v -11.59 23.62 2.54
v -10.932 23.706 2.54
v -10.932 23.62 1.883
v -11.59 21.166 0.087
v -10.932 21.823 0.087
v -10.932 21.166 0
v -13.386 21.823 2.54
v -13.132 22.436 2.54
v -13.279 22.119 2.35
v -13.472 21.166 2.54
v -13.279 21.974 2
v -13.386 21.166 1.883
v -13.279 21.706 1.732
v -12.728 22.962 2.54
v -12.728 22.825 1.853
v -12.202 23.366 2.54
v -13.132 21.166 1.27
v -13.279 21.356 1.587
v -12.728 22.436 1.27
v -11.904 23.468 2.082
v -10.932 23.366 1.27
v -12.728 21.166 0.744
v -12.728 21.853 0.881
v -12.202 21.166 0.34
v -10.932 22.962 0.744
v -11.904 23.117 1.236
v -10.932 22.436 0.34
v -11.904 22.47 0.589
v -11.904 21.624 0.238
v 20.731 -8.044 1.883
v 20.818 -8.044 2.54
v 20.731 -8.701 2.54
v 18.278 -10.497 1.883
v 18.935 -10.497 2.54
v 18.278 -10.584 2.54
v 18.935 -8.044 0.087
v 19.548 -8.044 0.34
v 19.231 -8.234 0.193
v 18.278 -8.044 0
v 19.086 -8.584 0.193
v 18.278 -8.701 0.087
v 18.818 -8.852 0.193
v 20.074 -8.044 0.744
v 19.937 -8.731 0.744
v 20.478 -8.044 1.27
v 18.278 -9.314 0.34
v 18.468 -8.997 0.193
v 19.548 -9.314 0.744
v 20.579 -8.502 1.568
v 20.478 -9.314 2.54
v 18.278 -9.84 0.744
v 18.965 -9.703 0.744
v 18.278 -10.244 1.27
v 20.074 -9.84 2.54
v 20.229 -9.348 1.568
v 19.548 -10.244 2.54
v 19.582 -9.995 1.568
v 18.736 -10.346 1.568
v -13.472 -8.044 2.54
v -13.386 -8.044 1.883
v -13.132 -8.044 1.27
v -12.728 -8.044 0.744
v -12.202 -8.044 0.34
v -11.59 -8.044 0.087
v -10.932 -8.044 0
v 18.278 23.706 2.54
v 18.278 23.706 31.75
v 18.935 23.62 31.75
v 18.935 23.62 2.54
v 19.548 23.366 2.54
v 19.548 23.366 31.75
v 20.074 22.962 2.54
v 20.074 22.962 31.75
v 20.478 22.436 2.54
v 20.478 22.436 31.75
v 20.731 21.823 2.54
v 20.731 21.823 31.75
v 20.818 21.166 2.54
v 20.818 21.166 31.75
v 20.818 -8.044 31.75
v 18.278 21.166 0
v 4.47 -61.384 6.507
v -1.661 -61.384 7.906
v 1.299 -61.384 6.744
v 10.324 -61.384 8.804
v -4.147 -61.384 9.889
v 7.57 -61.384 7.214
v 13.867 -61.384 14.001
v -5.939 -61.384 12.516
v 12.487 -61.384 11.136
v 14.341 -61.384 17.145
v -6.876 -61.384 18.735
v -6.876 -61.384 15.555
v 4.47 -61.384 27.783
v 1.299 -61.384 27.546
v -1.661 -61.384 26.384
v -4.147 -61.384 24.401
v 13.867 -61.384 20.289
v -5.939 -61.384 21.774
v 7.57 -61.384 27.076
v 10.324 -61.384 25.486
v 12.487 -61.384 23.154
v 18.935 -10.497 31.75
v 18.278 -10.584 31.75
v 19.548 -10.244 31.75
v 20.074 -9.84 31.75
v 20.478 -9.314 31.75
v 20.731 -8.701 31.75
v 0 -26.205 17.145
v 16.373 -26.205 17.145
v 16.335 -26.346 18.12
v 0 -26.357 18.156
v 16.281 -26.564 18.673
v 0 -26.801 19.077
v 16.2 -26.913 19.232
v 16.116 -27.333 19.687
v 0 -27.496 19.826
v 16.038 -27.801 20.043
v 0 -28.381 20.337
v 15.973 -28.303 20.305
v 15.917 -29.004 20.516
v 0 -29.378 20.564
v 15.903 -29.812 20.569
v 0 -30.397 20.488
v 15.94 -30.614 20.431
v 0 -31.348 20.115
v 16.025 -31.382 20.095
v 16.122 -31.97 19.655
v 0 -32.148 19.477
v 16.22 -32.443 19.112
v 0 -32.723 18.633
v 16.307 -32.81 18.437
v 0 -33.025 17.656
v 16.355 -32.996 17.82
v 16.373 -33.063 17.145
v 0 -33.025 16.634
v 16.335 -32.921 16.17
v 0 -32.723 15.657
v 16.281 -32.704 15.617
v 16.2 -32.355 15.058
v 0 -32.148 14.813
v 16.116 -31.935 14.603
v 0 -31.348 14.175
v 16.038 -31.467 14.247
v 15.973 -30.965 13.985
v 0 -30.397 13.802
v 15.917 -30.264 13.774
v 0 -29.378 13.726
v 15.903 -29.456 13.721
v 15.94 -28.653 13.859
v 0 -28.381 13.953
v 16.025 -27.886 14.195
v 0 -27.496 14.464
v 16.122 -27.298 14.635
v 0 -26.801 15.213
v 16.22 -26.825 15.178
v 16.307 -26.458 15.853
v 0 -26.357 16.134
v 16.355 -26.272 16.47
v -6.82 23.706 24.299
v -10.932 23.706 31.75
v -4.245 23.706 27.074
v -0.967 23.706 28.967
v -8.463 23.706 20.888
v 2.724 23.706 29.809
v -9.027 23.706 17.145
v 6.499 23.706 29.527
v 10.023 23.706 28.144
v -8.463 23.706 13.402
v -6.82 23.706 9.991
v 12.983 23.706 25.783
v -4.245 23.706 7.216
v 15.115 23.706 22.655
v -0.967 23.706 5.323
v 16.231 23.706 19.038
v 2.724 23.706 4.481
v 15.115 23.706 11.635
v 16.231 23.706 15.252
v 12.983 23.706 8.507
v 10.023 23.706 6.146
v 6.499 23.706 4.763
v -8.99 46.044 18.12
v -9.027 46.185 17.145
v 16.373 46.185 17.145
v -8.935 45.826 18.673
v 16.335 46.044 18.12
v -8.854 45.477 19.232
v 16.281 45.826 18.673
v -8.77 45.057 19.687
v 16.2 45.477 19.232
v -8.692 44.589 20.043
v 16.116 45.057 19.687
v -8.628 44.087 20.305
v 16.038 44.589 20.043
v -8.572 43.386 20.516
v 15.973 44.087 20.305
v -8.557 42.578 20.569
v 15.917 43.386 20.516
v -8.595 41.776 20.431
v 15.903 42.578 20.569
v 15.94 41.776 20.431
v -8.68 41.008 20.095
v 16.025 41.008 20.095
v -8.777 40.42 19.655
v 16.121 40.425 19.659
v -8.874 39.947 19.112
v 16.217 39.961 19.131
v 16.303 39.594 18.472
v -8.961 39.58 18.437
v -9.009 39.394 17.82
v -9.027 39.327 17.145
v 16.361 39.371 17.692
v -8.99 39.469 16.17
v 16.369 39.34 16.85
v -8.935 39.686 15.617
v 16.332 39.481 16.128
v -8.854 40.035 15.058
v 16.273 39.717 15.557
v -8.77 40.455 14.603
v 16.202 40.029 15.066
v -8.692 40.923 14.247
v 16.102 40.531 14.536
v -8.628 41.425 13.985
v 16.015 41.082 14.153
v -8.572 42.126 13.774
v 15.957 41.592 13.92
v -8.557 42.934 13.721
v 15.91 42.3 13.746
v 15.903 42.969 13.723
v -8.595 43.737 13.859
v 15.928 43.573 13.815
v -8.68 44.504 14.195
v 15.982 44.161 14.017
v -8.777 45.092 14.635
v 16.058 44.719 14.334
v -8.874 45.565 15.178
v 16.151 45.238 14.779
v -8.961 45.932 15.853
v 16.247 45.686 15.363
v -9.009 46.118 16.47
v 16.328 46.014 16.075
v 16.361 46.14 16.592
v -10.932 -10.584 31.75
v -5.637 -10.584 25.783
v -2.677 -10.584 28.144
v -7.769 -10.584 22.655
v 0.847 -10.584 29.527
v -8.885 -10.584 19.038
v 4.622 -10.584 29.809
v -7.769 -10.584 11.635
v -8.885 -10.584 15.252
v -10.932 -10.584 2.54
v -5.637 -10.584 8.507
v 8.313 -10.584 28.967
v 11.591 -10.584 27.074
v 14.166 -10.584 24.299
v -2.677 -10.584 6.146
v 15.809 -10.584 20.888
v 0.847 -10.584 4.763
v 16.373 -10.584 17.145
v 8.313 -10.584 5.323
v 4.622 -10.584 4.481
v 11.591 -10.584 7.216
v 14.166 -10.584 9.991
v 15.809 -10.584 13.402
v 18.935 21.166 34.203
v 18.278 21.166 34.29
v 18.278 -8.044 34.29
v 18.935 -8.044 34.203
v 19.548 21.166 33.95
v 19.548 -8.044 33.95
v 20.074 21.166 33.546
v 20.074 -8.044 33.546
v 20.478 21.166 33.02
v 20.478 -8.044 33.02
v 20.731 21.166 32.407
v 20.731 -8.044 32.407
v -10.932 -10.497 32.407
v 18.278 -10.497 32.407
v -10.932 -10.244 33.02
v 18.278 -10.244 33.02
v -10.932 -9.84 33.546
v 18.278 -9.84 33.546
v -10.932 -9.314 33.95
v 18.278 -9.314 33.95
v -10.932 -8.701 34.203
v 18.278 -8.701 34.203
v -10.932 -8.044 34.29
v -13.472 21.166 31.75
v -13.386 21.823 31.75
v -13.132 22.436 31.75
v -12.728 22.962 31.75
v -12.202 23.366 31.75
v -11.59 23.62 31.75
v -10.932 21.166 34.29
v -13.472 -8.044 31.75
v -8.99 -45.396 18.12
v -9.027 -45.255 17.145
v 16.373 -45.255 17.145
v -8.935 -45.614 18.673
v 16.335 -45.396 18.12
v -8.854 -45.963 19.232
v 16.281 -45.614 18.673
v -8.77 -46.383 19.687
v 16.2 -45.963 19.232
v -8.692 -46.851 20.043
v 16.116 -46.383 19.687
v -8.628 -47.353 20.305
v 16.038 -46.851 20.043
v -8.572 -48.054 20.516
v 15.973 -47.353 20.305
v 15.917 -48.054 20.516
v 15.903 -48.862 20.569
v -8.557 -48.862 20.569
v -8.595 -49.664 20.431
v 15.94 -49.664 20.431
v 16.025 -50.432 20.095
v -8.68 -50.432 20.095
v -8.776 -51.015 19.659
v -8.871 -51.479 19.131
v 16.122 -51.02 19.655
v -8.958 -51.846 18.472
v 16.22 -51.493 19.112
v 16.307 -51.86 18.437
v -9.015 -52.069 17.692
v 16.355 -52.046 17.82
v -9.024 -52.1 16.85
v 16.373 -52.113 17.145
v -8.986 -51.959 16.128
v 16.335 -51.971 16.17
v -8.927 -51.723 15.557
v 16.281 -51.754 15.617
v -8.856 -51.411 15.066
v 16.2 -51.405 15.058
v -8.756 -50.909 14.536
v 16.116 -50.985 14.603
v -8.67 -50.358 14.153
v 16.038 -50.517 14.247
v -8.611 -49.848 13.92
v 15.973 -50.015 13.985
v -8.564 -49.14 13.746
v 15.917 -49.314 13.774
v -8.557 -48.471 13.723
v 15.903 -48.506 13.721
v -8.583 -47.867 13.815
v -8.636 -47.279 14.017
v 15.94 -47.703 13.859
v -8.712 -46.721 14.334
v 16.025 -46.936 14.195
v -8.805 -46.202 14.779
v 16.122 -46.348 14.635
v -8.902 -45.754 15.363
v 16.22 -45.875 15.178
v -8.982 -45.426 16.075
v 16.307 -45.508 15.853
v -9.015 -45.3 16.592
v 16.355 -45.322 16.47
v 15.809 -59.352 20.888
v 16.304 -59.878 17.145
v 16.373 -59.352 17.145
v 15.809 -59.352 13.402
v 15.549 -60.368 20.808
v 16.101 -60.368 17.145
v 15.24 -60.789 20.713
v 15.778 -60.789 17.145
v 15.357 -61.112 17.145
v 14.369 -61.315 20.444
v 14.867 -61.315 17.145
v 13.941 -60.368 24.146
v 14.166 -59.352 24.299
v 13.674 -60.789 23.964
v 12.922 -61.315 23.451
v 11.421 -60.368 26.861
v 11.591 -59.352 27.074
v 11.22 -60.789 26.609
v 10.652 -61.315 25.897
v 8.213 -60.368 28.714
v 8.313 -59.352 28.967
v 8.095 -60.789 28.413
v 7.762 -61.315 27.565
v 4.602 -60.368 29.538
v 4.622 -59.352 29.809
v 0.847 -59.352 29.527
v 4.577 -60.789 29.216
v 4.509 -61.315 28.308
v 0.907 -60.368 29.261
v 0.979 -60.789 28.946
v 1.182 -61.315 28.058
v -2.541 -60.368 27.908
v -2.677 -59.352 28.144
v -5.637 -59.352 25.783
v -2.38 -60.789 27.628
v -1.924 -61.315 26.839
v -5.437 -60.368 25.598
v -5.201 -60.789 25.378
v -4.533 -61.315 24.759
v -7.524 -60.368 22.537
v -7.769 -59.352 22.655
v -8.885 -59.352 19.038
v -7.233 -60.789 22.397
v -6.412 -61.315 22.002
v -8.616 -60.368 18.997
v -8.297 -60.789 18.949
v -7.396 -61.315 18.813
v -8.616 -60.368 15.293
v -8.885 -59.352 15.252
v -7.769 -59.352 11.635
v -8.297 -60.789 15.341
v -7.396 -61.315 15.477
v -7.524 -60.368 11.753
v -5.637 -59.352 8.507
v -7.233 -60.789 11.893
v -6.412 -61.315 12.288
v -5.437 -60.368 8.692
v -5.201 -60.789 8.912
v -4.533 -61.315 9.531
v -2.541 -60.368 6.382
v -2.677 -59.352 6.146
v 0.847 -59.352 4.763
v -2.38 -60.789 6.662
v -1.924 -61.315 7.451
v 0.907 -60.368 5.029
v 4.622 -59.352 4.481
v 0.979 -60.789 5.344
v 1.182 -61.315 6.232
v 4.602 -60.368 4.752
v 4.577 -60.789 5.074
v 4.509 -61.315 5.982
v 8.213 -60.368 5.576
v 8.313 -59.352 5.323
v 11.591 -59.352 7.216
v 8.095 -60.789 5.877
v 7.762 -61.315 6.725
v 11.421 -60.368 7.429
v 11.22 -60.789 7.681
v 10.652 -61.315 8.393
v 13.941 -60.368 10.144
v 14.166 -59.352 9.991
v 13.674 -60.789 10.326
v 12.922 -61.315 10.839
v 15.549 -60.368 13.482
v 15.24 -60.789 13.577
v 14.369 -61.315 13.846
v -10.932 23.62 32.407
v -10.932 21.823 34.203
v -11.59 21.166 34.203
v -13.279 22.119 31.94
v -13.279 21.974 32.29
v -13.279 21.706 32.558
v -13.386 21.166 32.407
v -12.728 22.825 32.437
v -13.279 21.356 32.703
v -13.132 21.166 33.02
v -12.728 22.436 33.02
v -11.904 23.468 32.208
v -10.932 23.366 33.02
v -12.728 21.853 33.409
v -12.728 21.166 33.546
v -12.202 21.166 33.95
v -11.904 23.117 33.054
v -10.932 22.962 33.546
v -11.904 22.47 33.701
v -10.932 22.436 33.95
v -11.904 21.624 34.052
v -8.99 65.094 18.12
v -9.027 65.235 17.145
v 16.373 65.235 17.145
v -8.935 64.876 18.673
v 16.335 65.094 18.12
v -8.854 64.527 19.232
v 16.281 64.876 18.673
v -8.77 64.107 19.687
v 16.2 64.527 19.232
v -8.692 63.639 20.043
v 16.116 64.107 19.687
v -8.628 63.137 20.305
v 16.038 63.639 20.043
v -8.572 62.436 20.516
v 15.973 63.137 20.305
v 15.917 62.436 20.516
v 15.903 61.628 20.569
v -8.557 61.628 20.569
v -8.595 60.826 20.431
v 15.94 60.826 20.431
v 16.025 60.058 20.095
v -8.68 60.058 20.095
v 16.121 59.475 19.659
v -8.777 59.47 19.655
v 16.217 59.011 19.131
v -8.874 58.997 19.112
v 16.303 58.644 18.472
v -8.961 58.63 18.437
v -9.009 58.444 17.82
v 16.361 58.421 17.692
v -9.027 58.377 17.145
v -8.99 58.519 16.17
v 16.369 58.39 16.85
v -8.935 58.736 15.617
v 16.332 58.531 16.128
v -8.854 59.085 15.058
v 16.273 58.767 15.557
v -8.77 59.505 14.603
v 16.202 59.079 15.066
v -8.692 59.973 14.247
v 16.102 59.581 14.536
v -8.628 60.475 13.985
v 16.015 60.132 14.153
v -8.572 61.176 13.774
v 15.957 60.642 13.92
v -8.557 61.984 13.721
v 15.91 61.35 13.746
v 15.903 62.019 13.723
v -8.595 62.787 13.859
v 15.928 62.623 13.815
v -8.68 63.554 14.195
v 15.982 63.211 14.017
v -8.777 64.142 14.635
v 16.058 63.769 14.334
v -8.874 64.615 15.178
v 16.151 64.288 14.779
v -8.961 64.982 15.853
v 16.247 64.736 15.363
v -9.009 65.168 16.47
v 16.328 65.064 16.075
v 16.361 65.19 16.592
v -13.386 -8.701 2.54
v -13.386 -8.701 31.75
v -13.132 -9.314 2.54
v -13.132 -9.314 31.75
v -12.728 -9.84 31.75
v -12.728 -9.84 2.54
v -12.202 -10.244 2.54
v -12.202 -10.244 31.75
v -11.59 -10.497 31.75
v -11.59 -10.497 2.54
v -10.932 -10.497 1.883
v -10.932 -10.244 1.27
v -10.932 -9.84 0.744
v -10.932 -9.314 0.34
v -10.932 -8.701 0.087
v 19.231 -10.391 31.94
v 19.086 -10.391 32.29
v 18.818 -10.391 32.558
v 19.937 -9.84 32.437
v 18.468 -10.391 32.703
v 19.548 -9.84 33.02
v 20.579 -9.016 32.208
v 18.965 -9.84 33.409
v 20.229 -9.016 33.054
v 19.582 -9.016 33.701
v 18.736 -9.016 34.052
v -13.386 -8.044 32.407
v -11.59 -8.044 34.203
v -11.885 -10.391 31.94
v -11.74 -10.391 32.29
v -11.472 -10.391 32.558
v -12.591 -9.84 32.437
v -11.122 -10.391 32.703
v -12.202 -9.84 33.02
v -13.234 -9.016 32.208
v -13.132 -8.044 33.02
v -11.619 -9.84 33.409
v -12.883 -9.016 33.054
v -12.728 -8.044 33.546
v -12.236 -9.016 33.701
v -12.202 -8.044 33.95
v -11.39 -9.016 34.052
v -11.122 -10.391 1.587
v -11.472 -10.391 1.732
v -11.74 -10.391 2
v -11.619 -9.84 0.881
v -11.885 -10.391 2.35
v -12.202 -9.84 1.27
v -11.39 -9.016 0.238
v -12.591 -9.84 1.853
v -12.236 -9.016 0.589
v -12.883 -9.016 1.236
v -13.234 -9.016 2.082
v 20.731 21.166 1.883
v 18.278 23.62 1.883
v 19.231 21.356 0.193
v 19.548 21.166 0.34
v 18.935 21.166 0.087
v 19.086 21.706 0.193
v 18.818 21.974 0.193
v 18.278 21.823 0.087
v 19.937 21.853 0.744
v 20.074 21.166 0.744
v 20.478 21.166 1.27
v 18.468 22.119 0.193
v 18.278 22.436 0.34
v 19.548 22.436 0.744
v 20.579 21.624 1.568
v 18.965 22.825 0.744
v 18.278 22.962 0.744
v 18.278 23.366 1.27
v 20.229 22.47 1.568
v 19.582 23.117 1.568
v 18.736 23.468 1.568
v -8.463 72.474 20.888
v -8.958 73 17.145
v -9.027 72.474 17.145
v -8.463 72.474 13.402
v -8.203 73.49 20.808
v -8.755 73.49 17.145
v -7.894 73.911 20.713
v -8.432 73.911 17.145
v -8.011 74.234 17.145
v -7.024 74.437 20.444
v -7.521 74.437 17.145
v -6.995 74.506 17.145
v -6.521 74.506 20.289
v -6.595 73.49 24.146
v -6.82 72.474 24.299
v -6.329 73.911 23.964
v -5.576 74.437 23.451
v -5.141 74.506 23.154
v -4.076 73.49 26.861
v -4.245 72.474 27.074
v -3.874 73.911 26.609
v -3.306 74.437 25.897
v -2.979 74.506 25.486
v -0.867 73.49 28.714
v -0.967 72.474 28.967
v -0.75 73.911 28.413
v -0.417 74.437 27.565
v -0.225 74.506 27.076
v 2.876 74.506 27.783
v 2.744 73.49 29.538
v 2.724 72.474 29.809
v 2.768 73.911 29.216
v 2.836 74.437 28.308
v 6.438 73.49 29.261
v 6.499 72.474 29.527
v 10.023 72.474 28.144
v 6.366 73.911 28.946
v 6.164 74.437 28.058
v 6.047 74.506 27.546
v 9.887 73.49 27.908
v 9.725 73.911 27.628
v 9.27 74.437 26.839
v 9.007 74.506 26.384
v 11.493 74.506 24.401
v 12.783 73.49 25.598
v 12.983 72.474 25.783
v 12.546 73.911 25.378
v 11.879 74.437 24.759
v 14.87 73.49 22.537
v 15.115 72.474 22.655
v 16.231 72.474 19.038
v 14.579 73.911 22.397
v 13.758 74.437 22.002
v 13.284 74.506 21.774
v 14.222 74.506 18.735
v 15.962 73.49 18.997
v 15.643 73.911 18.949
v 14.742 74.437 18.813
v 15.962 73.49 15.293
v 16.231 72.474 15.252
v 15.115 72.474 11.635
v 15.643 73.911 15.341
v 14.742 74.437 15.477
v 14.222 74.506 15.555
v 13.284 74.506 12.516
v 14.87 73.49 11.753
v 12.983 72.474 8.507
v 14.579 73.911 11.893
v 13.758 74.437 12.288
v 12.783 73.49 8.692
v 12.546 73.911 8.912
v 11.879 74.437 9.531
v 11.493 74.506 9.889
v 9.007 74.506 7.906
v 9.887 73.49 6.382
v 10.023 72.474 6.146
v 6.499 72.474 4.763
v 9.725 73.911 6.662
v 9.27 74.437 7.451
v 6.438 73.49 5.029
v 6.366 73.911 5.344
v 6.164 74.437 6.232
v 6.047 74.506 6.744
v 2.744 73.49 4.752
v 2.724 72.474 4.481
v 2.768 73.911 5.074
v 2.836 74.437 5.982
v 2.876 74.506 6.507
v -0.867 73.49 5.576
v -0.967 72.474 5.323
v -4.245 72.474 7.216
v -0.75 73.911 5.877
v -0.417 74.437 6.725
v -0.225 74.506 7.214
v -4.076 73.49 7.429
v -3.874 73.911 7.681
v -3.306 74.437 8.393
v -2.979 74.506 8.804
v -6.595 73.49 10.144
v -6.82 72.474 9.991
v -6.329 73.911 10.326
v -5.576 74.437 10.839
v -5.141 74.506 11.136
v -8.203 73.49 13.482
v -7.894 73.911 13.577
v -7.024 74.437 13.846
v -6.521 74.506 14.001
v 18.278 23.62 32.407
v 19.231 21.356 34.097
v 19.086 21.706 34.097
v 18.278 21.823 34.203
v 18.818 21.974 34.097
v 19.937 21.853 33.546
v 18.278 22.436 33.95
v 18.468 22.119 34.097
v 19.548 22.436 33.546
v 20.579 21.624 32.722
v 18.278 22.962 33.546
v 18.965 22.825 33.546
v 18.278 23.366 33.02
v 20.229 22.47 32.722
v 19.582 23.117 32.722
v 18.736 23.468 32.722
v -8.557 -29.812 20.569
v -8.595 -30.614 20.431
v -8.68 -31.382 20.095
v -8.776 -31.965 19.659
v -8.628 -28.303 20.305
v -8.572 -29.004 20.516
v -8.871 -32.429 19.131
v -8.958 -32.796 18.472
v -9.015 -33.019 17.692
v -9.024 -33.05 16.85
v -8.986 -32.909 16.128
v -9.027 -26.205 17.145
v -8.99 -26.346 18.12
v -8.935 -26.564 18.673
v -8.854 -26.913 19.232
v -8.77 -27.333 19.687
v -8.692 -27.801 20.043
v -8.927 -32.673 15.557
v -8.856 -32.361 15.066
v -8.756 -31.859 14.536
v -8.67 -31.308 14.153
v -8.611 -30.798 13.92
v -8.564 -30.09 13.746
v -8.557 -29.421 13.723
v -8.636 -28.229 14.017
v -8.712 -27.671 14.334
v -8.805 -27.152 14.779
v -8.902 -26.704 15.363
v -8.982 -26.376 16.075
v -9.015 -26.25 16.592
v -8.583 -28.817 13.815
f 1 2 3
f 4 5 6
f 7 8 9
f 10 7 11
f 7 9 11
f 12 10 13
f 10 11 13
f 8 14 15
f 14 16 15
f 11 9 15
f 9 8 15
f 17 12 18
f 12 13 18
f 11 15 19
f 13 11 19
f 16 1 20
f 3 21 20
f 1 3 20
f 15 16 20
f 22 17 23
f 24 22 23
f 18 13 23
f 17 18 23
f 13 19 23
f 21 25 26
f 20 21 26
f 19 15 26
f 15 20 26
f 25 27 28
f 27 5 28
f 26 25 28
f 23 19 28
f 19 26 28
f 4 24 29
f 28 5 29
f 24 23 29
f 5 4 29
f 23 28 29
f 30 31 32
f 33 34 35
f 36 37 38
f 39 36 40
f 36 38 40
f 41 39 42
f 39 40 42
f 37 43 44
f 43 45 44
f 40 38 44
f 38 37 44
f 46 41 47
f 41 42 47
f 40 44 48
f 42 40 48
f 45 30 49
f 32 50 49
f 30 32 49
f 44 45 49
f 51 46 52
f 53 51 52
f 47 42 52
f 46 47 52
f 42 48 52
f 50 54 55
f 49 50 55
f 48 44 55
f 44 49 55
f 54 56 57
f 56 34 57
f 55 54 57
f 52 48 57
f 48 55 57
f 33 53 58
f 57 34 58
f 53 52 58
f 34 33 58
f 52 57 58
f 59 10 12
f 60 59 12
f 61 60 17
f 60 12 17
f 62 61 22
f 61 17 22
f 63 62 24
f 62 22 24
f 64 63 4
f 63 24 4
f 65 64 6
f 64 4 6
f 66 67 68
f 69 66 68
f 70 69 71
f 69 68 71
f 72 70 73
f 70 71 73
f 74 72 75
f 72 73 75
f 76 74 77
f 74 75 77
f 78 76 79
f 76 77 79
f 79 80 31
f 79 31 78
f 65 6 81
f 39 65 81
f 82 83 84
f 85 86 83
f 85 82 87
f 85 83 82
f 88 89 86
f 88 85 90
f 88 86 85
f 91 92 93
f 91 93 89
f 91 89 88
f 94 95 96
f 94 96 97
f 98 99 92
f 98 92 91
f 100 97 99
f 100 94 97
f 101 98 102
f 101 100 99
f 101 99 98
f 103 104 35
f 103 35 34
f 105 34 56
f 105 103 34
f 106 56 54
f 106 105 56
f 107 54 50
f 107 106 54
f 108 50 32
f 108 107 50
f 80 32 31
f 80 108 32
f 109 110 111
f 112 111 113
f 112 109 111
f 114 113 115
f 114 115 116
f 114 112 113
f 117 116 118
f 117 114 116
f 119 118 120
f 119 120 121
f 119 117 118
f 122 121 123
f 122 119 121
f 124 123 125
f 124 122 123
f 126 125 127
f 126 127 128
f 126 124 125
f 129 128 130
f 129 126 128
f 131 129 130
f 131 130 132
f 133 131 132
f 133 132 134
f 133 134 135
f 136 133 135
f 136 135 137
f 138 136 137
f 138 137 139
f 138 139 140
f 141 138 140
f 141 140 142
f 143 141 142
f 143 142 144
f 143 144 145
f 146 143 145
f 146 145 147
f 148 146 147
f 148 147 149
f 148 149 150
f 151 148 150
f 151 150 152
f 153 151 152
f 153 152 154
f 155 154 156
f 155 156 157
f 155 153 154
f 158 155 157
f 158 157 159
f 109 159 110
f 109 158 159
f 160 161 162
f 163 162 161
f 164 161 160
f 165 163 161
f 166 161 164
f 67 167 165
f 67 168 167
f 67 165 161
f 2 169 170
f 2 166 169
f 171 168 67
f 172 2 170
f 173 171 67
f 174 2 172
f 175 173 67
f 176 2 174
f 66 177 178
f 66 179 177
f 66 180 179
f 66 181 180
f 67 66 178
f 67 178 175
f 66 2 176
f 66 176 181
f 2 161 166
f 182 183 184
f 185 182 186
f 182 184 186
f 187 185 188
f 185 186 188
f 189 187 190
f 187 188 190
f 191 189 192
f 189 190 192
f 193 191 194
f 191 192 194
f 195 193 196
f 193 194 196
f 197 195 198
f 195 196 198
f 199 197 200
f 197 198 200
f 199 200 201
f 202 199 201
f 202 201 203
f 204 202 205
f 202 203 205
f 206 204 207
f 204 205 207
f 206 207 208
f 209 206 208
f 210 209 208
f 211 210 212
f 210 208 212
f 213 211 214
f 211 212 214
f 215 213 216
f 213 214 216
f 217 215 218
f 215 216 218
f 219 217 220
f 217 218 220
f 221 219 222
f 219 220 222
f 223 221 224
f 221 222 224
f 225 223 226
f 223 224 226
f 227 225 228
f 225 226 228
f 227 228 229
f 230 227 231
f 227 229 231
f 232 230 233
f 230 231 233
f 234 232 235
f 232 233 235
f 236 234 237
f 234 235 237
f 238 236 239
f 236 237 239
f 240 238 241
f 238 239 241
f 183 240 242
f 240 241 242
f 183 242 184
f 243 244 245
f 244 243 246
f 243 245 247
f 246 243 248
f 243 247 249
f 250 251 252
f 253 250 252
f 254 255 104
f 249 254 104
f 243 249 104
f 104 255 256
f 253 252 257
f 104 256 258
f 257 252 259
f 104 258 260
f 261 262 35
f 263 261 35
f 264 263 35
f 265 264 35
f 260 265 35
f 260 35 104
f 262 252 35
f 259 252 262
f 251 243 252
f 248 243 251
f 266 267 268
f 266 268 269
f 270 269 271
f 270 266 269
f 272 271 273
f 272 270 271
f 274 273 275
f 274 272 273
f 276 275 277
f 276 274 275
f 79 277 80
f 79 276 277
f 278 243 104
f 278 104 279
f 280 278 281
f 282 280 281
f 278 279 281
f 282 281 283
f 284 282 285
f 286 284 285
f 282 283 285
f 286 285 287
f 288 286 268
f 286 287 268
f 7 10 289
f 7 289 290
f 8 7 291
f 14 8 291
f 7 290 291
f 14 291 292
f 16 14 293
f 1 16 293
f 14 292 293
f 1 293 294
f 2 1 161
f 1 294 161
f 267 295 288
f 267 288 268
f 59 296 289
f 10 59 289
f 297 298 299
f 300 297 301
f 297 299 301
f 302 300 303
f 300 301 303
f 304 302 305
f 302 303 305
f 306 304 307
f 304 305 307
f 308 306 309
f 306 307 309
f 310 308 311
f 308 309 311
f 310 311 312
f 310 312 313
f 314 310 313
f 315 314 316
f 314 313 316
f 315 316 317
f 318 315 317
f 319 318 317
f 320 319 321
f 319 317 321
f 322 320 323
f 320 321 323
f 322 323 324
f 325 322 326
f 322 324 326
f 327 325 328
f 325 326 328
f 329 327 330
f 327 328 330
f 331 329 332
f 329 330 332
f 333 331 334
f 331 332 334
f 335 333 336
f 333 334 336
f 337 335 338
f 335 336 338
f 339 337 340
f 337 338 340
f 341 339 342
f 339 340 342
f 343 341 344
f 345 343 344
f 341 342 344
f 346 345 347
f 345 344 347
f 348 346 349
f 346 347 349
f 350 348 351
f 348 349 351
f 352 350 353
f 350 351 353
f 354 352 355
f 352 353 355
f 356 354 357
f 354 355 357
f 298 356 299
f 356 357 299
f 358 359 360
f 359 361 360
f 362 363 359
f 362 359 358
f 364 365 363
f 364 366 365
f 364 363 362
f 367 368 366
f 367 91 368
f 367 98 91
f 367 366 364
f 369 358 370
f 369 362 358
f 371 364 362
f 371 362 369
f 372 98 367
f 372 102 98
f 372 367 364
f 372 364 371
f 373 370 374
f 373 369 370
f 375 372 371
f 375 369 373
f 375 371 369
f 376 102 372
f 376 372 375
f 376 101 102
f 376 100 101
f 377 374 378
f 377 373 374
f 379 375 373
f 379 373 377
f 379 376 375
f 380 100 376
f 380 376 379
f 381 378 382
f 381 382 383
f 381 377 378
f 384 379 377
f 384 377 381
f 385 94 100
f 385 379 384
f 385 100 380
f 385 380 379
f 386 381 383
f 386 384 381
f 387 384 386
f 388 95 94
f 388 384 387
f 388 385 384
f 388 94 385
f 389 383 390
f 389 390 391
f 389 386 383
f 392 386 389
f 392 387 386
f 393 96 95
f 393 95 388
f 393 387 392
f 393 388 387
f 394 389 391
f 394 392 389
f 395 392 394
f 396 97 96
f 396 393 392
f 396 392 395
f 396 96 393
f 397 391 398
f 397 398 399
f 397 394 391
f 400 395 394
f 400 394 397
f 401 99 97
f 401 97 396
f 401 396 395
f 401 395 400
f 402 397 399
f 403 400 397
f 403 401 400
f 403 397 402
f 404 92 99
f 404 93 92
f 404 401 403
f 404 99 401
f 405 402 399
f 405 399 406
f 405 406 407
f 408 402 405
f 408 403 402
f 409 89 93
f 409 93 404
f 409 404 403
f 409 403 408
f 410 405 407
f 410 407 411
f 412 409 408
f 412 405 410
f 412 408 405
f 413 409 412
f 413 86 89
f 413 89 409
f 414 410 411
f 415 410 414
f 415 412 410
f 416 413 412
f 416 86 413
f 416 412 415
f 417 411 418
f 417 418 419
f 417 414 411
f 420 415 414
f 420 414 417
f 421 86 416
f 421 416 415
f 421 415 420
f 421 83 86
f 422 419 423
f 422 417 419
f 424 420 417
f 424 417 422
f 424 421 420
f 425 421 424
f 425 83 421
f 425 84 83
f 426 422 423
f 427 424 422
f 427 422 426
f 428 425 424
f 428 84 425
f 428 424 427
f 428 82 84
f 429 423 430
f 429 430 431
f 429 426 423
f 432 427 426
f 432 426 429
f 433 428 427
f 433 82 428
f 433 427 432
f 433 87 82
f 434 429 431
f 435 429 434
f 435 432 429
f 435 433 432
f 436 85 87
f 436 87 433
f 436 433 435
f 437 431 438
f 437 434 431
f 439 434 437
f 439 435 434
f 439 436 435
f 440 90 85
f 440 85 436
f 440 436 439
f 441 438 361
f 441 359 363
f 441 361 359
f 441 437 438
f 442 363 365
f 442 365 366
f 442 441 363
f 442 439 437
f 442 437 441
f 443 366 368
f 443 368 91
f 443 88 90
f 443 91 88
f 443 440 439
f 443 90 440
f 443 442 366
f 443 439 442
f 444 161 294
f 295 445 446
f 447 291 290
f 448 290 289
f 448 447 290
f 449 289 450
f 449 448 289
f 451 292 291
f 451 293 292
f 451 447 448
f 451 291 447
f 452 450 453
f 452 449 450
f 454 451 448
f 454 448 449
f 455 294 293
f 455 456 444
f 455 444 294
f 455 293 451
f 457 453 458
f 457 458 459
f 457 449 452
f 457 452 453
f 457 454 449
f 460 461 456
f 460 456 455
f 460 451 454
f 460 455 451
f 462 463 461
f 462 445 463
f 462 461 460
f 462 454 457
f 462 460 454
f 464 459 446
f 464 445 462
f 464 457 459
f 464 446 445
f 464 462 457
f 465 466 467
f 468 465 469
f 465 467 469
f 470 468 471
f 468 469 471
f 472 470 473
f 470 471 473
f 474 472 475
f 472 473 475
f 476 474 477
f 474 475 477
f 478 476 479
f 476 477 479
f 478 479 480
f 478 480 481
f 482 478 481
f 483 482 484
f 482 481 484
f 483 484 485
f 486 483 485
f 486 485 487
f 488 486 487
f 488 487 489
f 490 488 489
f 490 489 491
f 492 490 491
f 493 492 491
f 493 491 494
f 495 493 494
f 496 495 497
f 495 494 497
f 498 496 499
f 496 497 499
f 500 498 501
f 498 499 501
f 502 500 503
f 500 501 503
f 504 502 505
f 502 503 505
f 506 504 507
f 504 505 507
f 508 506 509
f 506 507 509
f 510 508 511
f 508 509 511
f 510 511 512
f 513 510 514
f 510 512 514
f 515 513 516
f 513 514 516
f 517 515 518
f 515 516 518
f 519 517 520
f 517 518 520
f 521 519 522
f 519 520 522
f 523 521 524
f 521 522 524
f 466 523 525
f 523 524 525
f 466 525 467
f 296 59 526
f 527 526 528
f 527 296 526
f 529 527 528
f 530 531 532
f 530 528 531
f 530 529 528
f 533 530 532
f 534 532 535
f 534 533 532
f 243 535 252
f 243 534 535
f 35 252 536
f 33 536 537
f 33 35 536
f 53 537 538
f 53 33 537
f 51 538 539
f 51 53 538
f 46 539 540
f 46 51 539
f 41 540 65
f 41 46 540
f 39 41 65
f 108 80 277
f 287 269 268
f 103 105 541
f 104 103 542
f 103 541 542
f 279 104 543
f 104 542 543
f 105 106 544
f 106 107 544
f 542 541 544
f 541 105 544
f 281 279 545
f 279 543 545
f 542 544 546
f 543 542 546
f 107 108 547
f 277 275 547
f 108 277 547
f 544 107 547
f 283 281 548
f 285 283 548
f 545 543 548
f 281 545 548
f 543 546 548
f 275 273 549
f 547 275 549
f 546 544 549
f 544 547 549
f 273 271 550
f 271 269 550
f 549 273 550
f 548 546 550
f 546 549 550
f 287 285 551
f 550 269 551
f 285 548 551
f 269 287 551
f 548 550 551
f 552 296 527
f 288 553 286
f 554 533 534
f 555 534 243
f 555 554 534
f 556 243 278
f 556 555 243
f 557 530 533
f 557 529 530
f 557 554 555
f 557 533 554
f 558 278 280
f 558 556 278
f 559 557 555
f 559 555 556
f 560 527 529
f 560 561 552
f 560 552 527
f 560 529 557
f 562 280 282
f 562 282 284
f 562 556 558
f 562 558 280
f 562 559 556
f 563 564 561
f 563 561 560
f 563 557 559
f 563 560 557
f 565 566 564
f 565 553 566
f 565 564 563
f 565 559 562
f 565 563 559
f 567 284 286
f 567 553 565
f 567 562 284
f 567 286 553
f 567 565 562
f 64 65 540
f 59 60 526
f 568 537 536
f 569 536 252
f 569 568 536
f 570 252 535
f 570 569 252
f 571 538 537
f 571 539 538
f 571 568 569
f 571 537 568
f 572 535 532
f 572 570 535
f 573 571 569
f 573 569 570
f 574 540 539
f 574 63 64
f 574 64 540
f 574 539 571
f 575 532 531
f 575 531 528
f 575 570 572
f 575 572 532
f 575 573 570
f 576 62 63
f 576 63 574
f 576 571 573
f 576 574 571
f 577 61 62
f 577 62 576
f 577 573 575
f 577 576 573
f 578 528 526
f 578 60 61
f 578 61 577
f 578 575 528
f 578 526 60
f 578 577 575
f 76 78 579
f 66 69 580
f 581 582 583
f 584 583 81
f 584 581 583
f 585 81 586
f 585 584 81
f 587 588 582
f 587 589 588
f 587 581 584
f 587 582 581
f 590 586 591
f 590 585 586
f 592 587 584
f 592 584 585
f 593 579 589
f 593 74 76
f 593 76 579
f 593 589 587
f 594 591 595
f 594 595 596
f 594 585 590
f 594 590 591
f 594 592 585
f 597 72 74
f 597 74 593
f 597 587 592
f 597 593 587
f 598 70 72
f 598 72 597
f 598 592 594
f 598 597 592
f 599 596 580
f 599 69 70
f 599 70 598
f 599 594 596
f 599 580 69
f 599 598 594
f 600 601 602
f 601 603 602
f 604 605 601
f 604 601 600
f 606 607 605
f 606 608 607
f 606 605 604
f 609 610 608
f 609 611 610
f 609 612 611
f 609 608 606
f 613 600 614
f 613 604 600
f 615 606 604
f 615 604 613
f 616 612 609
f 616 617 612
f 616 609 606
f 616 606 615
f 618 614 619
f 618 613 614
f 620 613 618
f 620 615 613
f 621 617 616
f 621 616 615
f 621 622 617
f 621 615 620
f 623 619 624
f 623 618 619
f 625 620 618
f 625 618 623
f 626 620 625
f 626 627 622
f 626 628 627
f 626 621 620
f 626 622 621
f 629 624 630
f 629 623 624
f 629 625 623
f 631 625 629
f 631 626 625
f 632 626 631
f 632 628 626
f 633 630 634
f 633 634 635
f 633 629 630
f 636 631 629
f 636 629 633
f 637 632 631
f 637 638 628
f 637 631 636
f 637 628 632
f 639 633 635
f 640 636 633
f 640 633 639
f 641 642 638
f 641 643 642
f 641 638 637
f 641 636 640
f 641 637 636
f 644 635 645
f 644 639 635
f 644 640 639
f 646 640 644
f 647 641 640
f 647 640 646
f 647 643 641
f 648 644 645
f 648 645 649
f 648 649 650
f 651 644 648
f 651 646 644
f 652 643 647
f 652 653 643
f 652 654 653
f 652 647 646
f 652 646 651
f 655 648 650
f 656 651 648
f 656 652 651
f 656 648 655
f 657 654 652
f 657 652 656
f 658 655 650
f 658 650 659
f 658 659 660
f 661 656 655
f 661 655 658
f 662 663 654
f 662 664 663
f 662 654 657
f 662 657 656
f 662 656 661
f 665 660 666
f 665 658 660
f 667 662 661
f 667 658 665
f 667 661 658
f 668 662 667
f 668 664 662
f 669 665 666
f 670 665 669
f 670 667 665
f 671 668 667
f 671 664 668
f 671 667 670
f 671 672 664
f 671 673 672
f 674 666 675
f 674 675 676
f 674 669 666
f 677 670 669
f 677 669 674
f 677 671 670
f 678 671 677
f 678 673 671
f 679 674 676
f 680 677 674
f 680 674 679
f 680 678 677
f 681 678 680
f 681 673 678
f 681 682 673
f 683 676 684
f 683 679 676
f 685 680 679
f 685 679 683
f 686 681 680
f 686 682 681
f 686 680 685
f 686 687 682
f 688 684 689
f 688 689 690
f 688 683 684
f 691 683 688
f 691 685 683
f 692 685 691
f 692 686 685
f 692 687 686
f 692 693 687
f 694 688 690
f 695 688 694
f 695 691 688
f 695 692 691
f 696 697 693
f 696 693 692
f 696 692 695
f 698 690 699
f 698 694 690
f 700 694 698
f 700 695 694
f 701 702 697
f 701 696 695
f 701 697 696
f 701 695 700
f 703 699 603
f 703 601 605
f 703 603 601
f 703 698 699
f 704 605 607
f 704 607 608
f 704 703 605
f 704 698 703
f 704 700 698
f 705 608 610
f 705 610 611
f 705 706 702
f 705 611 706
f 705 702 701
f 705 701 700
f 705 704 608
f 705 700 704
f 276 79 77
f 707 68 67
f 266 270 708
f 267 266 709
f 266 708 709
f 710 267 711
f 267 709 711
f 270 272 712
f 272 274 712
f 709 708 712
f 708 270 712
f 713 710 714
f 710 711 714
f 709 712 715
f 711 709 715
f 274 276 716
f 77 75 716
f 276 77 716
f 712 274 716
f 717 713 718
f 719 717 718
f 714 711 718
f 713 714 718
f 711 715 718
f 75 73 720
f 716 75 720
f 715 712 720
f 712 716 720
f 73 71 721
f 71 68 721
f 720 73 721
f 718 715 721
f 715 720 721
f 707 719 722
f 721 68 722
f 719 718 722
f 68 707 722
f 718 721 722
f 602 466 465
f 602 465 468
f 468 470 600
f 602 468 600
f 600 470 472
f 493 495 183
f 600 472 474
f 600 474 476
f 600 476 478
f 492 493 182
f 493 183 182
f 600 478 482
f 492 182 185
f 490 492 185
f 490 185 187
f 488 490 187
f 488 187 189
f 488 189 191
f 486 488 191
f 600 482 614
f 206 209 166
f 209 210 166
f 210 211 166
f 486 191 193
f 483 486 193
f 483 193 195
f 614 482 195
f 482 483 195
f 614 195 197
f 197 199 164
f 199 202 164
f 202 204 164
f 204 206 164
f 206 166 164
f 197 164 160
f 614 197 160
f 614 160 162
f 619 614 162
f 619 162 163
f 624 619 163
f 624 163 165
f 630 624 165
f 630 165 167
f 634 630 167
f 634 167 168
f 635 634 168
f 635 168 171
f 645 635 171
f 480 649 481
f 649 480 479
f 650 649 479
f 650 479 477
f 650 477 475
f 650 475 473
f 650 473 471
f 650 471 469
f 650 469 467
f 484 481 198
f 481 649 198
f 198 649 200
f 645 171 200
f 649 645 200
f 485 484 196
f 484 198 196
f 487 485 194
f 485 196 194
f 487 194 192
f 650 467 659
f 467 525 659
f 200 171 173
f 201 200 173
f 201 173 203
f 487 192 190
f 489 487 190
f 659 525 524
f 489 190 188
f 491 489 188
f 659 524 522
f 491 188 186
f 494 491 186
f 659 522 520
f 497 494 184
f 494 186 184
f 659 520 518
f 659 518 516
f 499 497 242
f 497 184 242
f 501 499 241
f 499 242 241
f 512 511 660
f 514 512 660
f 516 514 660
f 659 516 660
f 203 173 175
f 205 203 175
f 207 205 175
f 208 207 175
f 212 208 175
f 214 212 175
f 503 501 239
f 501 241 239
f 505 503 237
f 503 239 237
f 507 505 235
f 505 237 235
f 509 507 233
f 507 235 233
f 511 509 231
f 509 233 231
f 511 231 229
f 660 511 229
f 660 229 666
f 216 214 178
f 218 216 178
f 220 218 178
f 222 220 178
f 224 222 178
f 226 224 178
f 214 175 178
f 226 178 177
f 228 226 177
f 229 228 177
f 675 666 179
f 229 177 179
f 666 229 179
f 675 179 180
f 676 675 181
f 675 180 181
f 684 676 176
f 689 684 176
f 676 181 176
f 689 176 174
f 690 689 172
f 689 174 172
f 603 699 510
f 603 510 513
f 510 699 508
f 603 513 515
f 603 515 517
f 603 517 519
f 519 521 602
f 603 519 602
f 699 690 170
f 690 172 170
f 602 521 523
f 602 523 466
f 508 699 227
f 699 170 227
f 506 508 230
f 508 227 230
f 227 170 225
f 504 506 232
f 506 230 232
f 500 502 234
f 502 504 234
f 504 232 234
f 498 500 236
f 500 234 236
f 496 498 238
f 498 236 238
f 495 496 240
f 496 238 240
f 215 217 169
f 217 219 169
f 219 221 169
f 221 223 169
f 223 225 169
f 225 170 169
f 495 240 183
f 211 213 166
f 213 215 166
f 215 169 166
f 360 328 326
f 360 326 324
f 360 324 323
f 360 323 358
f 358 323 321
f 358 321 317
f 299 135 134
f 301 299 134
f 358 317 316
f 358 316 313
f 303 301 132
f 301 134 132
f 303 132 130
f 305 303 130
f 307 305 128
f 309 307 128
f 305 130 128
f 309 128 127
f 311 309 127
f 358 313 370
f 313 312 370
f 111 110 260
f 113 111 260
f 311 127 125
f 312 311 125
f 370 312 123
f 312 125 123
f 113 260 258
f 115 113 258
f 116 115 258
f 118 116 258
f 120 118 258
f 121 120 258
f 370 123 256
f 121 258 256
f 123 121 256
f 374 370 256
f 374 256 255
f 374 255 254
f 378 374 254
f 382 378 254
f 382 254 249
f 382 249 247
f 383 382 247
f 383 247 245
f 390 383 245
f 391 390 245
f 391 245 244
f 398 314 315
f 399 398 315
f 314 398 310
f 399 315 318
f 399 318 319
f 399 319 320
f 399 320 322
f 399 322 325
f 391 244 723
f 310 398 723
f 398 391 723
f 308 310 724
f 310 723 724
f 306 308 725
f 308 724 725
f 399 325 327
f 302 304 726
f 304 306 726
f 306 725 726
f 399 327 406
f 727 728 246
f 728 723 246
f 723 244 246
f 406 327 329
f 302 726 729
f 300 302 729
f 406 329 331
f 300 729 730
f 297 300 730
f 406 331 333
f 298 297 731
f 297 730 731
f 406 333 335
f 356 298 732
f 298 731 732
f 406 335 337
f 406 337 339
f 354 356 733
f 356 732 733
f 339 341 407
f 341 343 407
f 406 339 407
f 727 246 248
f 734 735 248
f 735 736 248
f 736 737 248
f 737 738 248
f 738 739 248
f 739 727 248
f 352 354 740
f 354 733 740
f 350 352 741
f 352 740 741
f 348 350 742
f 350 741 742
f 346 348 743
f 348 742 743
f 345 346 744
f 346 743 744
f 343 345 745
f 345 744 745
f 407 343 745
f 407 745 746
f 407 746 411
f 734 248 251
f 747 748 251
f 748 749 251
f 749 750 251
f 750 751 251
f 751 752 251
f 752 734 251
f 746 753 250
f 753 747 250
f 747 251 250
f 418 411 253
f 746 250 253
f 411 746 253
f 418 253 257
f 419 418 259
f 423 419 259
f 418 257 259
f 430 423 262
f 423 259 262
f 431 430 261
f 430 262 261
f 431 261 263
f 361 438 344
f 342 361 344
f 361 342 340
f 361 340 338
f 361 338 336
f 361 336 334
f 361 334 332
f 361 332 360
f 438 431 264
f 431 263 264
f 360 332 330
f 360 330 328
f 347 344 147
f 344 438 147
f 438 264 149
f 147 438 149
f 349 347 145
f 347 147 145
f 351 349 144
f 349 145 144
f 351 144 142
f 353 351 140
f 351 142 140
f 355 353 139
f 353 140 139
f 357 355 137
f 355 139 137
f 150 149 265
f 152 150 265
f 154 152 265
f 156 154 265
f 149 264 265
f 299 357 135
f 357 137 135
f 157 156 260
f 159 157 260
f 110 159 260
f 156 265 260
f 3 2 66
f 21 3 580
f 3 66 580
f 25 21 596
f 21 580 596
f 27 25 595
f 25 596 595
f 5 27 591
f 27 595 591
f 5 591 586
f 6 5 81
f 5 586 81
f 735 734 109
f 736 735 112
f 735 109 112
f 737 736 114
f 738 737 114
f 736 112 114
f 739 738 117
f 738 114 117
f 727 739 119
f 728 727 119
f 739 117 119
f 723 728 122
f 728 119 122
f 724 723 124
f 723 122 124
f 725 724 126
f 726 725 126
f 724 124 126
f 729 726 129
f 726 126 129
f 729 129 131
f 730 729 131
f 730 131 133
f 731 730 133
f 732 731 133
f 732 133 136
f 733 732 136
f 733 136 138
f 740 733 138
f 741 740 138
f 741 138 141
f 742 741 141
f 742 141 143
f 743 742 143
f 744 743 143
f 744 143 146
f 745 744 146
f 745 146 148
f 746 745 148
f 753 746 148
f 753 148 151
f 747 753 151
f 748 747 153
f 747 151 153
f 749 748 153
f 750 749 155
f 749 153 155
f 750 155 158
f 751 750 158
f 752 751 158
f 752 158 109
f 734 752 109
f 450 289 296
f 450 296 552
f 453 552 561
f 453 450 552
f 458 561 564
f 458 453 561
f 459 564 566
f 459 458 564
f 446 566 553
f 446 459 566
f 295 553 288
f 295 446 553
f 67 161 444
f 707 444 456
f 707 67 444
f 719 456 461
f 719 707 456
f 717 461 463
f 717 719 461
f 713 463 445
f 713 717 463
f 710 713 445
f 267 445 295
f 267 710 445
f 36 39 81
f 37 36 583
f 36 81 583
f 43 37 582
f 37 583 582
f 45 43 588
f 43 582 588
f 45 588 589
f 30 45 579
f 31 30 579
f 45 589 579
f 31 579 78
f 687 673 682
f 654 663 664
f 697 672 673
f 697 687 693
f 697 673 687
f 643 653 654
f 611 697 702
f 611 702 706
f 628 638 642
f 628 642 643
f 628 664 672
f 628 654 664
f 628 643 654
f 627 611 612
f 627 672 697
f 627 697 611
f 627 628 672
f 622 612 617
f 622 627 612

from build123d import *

# Parameters (mm, degrees)
F0_W      = 34.29
F0_H      = 34.29
F1_DEPTH  = 34.29
F3_R      = 12.7
F4_DEPTH  = 50.8
F5_R      = 3.429
F6_DEPTH  = 25.4
F7_R      = 3.429
F8_DEPTH  = 25.4
F9_R      = 3.429
F10_DEPTH = 25.4
F11_R     = 2.54
F12_R     = 12.7
F13_DEPTH = 50.8
F14_R     = 3.429
F15_DEPTH = 25.4
F16_R     = 2.032
F17_R     = 3.429
F18_DEPTH = 25.4


with BuildPart() as f1:
    # F0 (on Top) → F1 (new body)
    with BuildSketch(Plane.XY):
        with Locations((3.6728888822, 6.5610635031)):
            Rectangle(F0_W, F0_H)
    extrude(amount=F1_DEPTH)

    # F3 (on face) → F4 (join)
    with BuildSketch(Plane.XZ.offset(10.5839364969)):
        with Locations((3.6728888822, 17.145)):
            Circle(F3_R)
    extrude(amount=F4_DEPTH)

    # F5 (on Front) → F6 (cut, symmetric)
    with BuildSketch(Plane.XZ):
        with Locations((3.6728888822, 53.34)):
            Circle(F5_R)
        with Locations((3.6728888822, 72.39)):
            Circle(F5_R)
    extrude(amount=F6_DEPTH, both=True, mode=Mode.SUBTRACT)

    # F7 (on Right) → F8 (cut, symmetric)
    with BuildSketch(Plane.YZ):
        with Locations((-29.6339364969, 17.145)):
            Circle(F7_R)
        with Locations((-48.6839364969, 17.145)):
            Circle(F7_R)
    extrude(amount=F8_DEPTH, both=True, mode=Mode.SUBTRACT)

    # F9 (on Front) → F10 (cut, symmetric)
    with BuildSketch(Plane.XZ):
        with Locations((-51.5721111178, 17.145)):
            Circle(F9_R)
        with Locations((-32.5221111178, 17.145)):
            Circle(F9_R)
    extrude(amount=F10_DEPTH, both=True, mode=Mode.SUBTRACT)

    # F11
    f11_edges = [f1.edges().sort_by_distance(p)[0] for p in [
        (20.817889, 23.706064, 17.145),
        (20.817889, 6.561064, 34.29),
        (20.817889, -10.583936, 17.145),
        (20.817889, 6.561064, 0),
        (3.672889, 23.706064, 0),
        (3.672889, 23.706064, 34.29),
        (-13.472111, 23.706064, 17.145),
        (-13.472111, 6.561064, 0),
        (3.672889, -10.583936, 0),
        (-13.472111, 6.561064, 34.29),
        (-13.472111, -10.583936, 17.145),
        (3.672889, -10.583936, 34.29),
    ]]
    fillet(f11_edges, radius=F11_R)

    # F12 (on face) → F13 (join)
    with BuildSketch(Plane(origin=(0, 23.7060635031, 0), x_dir=(-1, 0, 0), z_dir=(0, 1, 0))):
        with Locations((-3.6728888822, 17.145)):
            Circle(F12_R)
    extrude(amount=F13_DEPTH)

    # F14 (on Right) → F15 (cut, symmetric)
    with BuildSketch(Plane.YZ):
        with Locations((42.7560635031, 17.145)):
            Circle(F14_R)
        with Locations((61.8060635031, 17.145)):
            Circle(F14_R)
    extrude(amount=F15_DEPTH, both=True, mode=Mode.SUBTRACT)

    # F16
    f16_edges = [f1.edges().sort_by_distance(p)[0] for p in [
        (-9.027111, -61.383936, 17.145),
        (16.372889, 74.506064, 17.145),
    ]]
    fillet(f16_edges, radius=F16_R)

    # F17 (on Front) → F18 (cut, symmetric)
    with BuildSketch(Plane.XZ):
        with Locations((58.9178888822, 17.145)):
            Circle(F17_R)
        with Locations((39.8678888822, 17.145)):
            Circle(F17_R)
    extrude(amount=F18_DEPTH, both=True, mode=Mode.SUBTRACT)


solid = f1.part
